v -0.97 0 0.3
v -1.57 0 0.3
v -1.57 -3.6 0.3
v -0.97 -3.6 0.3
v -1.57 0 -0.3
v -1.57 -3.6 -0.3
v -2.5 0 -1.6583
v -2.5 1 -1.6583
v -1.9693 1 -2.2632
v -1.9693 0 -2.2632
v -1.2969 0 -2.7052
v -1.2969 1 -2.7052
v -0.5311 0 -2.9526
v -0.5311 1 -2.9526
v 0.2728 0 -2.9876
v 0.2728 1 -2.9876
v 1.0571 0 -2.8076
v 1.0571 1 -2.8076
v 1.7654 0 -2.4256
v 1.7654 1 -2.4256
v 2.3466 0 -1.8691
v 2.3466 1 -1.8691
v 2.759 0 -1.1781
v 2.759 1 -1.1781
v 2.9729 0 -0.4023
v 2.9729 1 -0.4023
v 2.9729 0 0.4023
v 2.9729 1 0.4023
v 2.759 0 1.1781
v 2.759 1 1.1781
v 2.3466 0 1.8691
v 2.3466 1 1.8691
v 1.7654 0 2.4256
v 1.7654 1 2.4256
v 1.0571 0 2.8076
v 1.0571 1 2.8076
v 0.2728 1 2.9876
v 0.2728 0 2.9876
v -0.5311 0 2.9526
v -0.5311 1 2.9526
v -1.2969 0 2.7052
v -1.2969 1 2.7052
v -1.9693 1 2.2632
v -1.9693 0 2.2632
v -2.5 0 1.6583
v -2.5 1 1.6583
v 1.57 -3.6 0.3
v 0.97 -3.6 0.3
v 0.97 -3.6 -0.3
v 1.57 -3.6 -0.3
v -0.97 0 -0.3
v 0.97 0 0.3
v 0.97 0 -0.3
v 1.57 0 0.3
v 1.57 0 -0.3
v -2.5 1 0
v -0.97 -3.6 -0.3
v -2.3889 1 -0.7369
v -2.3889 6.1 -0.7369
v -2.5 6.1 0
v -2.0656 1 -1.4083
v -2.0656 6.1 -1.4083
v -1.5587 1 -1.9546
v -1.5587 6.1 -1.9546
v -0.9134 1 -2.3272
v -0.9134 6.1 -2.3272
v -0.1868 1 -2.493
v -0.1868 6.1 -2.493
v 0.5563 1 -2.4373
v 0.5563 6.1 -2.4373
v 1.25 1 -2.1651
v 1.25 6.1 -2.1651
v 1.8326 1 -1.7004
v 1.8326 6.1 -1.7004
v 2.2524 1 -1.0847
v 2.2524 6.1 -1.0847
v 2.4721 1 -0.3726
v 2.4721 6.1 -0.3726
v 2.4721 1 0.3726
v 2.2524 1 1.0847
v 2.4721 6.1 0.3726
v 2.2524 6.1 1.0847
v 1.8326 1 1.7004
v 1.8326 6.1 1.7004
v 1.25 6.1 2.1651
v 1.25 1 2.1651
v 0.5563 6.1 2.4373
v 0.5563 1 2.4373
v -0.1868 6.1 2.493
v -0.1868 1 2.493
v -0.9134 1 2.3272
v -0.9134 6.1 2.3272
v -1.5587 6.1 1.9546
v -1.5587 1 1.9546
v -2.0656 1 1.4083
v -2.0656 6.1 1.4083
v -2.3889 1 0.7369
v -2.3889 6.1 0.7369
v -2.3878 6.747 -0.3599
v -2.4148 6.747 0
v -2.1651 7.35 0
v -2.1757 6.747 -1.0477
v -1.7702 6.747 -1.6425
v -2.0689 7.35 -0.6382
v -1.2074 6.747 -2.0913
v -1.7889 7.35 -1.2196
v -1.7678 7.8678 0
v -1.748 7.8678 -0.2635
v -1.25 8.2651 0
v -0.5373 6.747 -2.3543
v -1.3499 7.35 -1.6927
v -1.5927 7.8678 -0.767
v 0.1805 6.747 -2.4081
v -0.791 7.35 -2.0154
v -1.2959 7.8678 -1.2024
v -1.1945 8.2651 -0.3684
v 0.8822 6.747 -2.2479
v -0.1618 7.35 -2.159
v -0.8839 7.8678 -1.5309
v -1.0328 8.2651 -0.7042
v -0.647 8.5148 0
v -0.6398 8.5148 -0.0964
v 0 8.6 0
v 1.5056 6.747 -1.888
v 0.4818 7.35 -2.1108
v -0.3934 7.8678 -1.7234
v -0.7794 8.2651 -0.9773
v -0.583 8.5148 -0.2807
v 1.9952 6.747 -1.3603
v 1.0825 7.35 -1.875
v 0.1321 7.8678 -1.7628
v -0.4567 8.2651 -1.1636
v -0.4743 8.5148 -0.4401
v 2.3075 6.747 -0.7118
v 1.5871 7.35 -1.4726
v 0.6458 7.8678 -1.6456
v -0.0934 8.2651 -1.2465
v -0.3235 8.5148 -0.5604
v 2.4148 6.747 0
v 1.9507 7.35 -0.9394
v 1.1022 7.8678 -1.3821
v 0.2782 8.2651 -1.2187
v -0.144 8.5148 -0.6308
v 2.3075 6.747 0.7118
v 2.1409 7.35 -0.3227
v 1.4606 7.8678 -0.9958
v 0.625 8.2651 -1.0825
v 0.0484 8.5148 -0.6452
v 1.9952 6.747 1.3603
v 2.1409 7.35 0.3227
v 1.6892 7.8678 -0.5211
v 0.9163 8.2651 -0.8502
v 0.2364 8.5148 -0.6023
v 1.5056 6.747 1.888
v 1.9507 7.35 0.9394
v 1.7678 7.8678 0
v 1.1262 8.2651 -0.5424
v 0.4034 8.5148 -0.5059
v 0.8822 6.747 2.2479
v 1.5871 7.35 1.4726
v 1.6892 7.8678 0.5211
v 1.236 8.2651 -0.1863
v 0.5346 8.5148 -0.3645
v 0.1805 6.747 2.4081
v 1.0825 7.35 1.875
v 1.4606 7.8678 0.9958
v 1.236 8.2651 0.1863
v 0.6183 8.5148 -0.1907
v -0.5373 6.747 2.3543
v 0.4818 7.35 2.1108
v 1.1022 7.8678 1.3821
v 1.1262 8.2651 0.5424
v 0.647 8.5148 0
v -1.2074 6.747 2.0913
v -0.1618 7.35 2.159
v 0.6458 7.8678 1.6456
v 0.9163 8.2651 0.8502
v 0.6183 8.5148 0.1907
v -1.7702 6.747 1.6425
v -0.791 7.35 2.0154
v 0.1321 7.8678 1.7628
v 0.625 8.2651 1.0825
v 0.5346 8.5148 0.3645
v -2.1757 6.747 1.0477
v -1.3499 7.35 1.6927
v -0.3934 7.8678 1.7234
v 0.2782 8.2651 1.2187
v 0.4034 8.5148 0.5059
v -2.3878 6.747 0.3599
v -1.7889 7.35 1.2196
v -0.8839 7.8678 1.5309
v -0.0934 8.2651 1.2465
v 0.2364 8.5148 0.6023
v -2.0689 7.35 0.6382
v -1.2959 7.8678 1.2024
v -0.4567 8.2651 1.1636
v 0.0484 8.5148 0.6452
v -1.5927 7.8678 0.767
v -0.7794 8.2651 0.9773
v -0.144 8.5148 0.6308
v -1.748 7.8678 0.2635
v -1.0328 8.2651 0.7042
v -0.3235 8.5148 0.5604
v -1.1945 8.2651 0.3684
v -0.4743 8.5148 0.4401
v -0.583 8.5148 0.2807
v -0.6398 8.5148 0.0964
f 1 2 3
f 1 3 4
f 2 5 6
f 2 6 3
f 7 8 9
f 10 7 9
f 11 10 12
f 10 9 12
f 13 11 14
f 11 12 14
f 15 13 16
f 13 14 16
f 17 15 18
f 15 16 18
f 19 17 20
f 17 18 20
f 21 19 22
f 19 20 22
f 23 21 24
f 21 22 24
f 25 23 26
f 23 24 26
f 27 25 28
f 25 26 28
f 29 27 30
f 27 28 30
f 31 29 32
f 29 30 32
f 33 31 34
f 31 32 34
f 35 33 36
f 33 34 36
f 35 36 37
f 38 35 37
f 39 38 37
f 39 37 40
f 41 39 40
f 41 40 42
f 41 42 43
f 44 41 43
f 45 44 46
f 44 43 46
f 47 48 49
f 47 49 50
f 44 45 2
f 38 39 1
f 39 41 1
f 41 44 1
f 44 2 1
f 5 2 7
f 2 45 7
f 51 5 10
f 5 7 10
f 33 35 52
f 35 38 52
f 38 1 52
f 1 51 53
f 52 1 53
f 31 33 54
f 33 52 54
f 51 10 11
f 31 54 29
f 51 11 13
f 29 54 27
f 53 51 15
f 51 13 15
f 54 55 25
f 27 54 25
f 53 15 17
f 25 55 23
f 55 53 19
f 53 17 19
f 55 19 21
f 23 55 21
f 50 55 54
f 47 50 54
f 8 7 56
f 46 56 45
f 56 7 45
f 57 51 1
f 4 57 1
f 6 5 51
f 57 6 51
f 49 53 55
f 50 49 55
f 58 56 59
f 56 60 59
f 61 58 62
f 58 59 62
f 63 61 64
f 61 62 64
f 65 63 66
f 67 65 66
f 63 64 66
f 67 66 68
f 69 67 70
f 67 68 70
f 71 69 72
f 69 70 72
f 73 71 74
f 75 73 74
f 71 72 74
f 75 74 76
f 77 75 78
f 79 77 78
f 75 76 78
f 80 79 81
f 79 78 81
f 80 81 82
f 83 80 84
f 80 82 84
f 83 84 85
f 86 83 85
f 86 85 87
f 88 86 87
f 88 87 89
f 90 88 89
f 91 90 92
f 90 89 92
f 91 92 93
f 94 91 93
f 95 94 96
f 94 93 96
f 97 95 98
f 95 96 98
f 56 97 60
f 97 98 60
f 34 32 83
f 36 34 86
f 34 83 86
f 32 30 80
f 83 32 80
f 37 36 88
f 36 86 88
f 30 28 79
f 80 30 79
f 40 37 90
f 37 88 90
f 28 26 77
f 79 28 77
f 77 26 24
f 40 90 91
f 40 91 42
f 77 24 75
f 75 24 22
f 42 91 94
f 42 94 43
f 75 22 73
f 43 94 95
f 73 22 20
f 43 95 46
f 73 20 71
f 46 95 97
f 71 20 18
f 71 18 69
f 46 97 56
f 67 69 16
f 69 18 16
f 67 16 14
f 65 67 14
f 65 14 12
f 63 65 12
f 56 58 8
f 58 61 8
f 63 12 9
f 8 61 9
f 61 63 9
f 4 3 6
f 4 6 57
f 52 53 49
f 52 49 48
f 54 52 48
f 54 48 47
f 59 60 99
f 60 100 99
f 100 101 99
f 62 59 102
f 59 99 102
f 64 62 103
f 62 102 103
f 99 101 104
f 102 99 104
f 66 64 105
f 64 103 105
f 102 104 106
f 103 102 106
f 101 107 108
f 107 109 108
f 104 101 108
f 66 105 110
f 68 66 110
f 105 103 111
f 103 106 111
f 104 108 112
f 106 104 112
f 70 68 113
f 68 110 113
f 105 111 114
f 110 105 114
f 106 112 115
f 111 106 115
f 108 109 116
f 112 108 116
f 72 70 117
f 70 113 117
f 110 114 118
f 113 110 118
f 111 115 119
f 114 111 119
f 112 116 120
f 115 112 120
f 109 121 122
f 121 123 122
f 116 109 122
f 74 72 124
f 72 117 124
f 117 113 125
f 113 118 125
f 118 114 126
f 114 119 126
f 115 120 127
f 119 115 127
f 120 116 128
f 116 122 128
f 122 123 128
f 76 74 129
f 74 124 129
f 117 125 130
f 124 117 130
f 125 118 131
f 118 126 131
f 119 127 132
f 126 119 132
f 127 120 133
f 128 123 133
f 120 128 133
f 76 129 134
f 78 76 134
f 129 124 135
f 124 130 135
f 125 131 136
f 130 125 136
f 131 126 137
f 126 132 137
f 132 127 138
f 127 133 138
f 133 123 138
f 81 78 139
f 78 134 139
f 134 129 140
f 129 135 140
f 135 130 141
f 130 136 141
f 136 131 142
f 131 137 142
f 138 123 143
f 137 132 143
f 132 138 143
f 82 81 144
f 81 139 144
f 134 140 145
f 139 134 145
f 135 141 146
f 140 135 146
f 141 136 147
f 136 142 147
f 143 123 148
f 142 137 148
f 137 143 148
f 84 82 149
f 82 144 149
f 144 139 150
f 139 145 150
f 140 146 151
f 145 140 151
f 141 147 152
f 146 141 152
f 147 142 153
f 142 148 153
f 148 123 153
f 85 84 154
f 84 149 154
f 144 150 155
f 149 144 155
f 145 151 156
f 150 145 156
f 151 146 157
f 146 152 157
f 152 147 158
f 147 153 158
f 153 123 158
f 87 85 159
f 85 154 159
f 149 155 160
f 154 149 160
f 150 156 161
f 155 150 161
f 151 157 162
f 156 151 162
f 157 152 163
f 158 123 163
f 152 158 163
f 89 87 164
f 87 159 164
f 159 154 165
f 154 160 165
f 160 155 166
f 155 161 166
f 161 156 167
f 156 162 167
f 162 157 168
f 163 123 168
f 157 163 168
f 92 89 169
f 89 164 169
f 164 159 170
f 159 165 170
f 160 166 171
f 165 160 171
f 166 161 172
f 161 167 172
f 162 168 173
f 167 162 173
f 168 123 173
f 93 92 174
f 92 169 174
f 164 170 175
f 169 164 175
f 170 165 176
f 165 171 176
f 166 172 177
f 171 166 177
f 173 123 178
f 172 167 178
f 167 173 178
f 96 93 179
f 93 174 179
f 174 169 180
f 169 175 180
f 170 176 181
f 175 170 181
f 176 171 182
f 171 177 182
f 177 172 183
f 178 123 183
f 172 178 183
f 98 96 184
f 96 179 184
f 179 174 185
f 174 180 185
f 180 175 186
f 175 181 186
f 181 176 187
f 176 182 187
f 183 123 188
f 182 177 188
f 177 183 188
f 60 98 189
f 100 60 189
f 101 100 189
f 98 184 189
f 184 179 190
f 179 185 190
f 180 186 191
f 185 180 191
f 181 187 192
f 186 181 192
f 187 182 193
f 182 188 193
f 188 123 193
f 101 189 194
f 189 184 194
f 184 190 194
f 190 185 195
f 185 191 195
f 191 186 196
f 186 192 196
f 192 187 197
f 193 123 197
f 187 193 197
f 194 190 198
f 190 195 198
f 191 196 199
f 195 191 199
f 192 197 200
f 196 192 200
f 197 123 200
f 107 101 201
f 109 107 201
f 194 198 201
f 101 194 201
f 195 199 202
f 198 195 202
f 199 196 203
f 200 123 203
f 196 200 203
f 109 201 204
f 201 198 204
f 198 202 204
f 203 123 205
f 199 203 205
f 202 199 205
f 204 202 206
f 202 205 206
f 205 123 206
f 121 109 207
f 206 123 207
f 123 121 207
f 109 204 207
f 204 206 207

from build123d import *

# Parameters (mm, degrees)
ESQUISSE2_W             = 0.6
ESQUISSE2_H             = 0.6
BOSS_EXTRU_1_DEPTH      = 3.6
ESQUISSE3_W             = 1
ESQUISSE3_H             = 4
ENL_V_MAT_EXTRU_1_DEPTH = 9.6


with BuildPart() as part:
    # Esquisse1 → Révolution1 (revolve)
    with BuildSketch(Plane.XY):
        with BuildLine():
            Line((0, 0), (-3, 0))
            Line((-3, 0), (-3, 1))
            Line((-3, 1), (-2.5, 1))
            Line((-2.5, 1), (-2.5, 6.1))
            ThreePointArc((-2.5, 6.1), (-1.767766953, 7.867766953), (0, 8.6))
            Line((0, 8.6), (0, 0))
        make_face()
    revolve(axis=Axis((0, 8.6, 0), (0, -1, 0)))

    # Esquisse2 → Boss.-Extru.1 (add)
    with BuildSketch(Plane.XZ):
        with Locations((-1.27, 0)):
            Rectangle(ESQUISSE2_W, ESQUISSE2_H)
        with Locations((1.27, 0)):
            Rectangle(ESQUISSE2_W, ESQUISSE2_H)
    extrude(amount=BOSS_EXTRU_1_DEPTH)

    # Esquisse3 → Enlèv. mat.-Extru.1 (cut, through all)
    with BuildSketch(Plane.XZ):
        with Locations((-3, 0)):
            Rectangle(ESQUISSE3_W, ESQUISSE3_H)
    extrude(amount=-ENL_V_MAT_EXTRU_1_DEPTH, mode=Mode.SUBTRACT)


solid = part.part
